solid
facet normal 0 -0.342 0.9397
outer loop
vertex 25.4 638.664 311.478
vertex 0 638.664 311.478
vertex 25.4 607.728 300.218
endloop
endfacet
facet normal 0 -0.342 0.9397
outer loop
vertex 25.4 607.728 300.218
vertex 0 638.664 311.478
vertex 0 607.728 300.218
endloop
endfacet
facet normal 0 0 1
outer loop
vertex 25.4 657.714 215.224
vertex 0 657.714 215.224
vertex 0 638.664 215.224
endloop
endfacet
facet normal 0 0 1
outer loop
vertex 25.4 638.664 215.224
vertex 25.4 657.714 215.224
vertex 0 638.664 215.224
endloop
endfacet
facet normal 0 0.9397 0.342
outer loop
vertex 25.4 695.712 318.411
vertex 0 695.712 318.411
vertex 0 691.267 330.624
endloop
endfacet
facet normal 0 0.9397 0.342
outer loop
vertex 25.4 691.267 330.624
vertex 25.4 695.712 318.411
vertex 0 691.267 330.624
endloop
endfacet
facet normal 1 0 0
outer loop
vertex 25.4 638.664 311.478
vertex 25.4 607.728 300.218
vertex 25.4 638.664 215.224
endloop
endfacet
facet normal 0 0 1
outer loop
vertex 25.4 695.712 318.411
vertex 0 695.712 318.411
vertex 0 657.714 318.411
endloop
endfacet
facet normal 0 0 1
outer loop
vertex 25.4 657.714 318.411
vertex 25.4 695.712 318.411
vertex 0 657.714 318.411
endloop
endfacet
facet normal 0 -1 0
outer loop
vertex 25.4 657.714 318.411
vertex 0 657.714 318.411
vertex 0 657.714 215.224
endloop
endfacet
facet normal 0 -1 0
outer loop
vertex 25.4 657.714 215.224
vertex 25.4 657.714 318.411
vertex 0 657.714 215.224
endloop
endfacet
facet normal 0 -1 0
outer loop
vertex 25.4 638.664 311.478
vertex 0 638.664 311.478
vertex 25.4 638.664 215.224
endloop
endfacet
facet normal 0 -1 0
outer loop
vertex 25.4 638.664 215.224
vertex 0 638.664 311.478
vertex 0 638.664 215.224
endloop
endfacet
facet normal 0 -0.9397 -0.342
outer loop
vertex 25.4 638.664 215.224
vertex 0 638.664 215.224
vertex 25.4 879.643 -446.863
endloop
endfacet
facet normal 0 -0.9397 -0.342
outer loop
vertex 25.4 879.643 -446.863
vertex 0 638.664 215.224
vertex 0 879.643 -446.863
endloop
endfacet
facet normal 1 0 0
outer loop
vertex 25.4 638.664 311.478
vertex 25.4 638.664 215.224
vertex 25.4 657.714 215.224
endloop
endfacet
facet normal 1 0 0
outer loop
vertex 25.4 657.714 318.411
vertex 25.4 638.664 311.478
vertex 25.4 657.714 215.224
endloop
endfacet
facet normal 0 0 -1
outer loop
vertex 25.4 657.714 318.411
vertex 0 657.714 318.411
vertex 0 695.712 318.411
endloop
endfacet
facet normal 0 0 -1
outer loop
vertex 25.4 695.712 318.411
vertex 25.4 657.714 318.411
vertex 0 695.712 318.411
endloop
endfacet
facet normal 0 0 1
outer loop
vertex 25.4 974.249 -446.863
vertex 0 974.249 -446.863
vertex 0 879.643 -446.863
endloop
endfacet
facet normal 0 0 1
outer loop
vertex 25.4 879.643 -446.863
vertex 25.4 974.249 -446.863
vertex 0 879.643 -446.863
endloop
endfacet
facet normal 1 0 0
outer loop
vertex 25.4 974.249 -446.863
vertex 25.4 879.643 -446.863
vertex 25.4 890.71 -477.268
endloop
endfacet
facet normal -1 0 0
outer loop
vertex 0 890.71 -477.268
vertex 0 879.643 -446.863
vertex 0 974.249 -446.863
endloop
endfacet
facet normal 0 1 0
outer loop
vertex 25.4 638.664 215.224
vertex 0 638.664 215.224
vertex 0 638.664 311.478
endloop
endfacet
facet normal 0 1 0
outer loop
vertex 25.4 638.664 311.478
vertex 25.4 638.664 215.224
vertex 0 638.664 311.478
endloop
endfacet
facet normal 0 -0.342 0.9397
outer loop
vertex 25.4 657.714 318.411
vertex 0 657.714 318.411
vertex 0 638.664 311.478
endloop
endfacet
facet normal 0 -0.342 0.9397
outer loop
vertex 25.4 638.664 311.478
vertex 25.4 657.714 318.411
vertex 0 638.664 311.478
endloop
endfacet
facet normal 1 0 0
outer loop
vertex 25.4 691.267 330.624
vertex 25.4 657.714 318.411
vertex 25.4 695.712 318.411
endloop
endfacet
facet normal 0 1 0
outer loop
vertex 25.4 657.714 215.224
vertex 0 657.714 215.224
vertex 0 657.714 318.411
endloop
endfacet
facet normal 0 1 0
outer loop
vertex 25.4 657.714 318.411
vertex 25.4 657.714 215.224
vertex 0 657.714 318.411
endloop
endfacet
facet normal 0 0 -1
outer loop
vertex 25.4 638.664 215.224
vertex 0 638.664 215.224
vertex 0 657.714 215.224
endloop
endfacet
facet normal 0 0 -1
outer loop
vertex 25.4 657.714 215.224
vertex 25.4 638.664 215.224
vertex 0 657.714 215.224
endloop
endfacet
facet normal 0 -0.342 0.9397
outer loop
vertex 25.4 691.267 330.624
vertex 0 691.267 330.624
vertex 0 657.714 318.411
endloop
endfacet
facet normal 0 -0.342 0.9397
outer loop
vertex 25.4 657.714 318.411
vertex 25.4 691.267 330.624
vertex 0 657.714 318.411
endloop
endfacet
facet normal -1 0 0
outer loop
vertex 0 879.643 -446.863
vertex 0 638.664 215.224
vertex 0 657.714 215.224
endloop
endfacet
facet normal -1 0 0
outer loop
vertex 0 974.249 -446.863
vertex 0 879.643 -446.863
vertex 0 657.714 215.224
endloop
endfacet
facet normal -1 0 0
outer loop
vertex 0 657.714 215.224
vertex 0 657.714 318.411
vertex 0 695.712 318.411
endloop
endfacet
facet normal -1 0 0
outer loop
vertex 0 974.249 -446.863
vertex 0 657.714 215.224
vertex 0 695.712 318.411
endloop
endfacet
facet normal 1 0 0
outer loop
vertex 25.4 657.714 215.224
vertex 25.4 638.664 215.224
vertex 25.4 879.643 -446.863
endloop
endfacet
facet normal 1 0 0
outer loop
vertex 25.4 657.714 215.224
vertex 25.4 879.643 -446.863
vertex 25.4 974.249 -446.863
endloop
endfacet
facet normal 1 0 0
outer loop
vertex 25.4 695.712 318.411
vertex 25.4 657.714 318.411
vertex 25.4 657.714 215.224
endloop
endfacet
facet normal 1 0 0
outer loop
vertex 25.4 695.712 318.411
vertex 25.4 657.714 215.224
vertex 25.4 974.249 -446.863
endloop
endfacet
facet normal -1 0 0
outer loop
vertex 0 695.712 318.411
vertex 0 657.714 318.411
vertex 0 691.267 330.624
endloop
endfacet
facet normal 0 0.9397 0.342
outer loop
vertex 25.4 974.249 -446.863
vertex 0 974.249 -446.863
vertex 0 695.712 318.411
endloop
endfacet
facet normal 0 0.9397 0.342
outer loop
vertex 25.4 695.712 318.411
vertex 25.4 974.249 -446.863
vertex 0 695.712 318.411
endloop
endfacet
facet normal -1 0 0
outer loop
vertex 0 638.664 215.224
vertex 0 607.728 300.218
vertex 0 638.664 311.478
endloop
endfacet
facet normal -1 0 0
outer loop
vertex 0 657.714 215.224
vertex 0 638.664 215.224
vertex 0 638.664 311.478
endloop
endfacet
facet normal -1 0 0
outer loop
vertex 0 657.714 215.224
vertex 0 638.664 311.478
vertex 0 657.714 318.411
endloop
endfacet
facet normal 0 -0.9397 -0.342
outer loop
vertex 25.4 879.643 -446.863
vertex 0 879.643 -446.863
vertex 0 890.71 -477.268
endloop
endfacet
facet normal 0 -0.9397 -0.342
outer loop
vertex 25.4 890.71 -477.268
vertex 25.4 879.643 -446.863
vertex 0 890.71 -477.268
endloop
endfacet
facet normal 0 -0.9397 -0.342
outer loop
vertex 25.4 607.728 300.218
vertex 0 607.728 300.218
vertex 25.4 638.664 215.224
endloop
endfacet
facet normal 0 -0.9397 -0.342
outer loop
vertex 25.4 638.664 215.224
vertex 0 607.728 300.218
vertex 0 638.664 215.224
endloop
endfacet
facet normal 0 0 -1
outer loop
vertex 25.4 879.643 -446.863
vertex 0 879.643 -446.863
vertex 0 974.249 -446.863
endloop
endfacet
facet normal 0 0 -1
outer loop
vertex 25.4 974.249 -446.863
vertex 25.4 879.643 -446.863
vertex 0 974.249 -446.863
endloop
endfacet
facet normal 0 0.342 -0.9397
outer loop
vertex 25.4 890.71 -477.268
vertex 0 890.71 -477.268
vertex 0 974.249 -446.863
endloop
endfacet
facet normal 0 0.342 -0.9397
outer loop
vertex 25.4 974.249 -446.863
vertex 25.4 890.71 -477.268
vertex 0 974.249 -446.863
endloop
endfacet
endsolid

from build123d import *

# Parameters (mm, degrees)
F1_DEPTH = 25.4
F2_DEPTH = 25.4
F3_DEPTH = 25.4
F4_DEPTH = 25.4
F5_DEPTH = 25.4


with BuildPart() as f1:
    # F0 (on Right) → F1 (new body)
    with BuildSketch(Plane.YZ):
        Polygon((691.266814, 330.62366), (657.713537, 318.411266), (695.711762, 318.411266), align=None)
    extrude(amount=F1_DEPTH)


with BuildPart() as f2:
    # F0 (on Right) → F2 (new body)
    with BuildSketch(Plane.YZ):
        Polygon((607.72814, 300.218069), (638.663537, 215.223766), (638.663537, 311.477633), align=None)
    extrude(amount=F2_DEPTH)


with BuildPart() as f3:
    # F0 (on Right) → F3 (new body)
    with BuildSketch(Plane.YZ):
        Polygon((974.248691, -446.862658), (879.643287, -446.862658), (890.710017, -477.268249), align=None)
    extrude(amount=F3_DEPTH)


with BuildPart() as f4:
    # F0 (on Right) → F4 (new body)
    with BuildSketch(Plane.YZ):
        Polygon((638.663537, 311.477633), (638.663537, 215.223766), (657.713537, 215.223766), (657.713537, 318.411266), align=None)
    extrude(amount=F4_DEPTH)


with BuildPart() as f5:
    # F0 (on Right) → F5 (new body)
    with BuildSketch(Plane.YZ):
        Polygon((657.713537, 215.223766), (638.663537, 215.223766), (879.643287, -446.862658), (974.248691, -446.862658), (695.711762, 318.411266), (657.713537, 318.411266), align=None)
    extrude(amount=F5_DEPTH)


solid = Compound([f1.part, f2.part, f3.part, f4.part, f5.part])
